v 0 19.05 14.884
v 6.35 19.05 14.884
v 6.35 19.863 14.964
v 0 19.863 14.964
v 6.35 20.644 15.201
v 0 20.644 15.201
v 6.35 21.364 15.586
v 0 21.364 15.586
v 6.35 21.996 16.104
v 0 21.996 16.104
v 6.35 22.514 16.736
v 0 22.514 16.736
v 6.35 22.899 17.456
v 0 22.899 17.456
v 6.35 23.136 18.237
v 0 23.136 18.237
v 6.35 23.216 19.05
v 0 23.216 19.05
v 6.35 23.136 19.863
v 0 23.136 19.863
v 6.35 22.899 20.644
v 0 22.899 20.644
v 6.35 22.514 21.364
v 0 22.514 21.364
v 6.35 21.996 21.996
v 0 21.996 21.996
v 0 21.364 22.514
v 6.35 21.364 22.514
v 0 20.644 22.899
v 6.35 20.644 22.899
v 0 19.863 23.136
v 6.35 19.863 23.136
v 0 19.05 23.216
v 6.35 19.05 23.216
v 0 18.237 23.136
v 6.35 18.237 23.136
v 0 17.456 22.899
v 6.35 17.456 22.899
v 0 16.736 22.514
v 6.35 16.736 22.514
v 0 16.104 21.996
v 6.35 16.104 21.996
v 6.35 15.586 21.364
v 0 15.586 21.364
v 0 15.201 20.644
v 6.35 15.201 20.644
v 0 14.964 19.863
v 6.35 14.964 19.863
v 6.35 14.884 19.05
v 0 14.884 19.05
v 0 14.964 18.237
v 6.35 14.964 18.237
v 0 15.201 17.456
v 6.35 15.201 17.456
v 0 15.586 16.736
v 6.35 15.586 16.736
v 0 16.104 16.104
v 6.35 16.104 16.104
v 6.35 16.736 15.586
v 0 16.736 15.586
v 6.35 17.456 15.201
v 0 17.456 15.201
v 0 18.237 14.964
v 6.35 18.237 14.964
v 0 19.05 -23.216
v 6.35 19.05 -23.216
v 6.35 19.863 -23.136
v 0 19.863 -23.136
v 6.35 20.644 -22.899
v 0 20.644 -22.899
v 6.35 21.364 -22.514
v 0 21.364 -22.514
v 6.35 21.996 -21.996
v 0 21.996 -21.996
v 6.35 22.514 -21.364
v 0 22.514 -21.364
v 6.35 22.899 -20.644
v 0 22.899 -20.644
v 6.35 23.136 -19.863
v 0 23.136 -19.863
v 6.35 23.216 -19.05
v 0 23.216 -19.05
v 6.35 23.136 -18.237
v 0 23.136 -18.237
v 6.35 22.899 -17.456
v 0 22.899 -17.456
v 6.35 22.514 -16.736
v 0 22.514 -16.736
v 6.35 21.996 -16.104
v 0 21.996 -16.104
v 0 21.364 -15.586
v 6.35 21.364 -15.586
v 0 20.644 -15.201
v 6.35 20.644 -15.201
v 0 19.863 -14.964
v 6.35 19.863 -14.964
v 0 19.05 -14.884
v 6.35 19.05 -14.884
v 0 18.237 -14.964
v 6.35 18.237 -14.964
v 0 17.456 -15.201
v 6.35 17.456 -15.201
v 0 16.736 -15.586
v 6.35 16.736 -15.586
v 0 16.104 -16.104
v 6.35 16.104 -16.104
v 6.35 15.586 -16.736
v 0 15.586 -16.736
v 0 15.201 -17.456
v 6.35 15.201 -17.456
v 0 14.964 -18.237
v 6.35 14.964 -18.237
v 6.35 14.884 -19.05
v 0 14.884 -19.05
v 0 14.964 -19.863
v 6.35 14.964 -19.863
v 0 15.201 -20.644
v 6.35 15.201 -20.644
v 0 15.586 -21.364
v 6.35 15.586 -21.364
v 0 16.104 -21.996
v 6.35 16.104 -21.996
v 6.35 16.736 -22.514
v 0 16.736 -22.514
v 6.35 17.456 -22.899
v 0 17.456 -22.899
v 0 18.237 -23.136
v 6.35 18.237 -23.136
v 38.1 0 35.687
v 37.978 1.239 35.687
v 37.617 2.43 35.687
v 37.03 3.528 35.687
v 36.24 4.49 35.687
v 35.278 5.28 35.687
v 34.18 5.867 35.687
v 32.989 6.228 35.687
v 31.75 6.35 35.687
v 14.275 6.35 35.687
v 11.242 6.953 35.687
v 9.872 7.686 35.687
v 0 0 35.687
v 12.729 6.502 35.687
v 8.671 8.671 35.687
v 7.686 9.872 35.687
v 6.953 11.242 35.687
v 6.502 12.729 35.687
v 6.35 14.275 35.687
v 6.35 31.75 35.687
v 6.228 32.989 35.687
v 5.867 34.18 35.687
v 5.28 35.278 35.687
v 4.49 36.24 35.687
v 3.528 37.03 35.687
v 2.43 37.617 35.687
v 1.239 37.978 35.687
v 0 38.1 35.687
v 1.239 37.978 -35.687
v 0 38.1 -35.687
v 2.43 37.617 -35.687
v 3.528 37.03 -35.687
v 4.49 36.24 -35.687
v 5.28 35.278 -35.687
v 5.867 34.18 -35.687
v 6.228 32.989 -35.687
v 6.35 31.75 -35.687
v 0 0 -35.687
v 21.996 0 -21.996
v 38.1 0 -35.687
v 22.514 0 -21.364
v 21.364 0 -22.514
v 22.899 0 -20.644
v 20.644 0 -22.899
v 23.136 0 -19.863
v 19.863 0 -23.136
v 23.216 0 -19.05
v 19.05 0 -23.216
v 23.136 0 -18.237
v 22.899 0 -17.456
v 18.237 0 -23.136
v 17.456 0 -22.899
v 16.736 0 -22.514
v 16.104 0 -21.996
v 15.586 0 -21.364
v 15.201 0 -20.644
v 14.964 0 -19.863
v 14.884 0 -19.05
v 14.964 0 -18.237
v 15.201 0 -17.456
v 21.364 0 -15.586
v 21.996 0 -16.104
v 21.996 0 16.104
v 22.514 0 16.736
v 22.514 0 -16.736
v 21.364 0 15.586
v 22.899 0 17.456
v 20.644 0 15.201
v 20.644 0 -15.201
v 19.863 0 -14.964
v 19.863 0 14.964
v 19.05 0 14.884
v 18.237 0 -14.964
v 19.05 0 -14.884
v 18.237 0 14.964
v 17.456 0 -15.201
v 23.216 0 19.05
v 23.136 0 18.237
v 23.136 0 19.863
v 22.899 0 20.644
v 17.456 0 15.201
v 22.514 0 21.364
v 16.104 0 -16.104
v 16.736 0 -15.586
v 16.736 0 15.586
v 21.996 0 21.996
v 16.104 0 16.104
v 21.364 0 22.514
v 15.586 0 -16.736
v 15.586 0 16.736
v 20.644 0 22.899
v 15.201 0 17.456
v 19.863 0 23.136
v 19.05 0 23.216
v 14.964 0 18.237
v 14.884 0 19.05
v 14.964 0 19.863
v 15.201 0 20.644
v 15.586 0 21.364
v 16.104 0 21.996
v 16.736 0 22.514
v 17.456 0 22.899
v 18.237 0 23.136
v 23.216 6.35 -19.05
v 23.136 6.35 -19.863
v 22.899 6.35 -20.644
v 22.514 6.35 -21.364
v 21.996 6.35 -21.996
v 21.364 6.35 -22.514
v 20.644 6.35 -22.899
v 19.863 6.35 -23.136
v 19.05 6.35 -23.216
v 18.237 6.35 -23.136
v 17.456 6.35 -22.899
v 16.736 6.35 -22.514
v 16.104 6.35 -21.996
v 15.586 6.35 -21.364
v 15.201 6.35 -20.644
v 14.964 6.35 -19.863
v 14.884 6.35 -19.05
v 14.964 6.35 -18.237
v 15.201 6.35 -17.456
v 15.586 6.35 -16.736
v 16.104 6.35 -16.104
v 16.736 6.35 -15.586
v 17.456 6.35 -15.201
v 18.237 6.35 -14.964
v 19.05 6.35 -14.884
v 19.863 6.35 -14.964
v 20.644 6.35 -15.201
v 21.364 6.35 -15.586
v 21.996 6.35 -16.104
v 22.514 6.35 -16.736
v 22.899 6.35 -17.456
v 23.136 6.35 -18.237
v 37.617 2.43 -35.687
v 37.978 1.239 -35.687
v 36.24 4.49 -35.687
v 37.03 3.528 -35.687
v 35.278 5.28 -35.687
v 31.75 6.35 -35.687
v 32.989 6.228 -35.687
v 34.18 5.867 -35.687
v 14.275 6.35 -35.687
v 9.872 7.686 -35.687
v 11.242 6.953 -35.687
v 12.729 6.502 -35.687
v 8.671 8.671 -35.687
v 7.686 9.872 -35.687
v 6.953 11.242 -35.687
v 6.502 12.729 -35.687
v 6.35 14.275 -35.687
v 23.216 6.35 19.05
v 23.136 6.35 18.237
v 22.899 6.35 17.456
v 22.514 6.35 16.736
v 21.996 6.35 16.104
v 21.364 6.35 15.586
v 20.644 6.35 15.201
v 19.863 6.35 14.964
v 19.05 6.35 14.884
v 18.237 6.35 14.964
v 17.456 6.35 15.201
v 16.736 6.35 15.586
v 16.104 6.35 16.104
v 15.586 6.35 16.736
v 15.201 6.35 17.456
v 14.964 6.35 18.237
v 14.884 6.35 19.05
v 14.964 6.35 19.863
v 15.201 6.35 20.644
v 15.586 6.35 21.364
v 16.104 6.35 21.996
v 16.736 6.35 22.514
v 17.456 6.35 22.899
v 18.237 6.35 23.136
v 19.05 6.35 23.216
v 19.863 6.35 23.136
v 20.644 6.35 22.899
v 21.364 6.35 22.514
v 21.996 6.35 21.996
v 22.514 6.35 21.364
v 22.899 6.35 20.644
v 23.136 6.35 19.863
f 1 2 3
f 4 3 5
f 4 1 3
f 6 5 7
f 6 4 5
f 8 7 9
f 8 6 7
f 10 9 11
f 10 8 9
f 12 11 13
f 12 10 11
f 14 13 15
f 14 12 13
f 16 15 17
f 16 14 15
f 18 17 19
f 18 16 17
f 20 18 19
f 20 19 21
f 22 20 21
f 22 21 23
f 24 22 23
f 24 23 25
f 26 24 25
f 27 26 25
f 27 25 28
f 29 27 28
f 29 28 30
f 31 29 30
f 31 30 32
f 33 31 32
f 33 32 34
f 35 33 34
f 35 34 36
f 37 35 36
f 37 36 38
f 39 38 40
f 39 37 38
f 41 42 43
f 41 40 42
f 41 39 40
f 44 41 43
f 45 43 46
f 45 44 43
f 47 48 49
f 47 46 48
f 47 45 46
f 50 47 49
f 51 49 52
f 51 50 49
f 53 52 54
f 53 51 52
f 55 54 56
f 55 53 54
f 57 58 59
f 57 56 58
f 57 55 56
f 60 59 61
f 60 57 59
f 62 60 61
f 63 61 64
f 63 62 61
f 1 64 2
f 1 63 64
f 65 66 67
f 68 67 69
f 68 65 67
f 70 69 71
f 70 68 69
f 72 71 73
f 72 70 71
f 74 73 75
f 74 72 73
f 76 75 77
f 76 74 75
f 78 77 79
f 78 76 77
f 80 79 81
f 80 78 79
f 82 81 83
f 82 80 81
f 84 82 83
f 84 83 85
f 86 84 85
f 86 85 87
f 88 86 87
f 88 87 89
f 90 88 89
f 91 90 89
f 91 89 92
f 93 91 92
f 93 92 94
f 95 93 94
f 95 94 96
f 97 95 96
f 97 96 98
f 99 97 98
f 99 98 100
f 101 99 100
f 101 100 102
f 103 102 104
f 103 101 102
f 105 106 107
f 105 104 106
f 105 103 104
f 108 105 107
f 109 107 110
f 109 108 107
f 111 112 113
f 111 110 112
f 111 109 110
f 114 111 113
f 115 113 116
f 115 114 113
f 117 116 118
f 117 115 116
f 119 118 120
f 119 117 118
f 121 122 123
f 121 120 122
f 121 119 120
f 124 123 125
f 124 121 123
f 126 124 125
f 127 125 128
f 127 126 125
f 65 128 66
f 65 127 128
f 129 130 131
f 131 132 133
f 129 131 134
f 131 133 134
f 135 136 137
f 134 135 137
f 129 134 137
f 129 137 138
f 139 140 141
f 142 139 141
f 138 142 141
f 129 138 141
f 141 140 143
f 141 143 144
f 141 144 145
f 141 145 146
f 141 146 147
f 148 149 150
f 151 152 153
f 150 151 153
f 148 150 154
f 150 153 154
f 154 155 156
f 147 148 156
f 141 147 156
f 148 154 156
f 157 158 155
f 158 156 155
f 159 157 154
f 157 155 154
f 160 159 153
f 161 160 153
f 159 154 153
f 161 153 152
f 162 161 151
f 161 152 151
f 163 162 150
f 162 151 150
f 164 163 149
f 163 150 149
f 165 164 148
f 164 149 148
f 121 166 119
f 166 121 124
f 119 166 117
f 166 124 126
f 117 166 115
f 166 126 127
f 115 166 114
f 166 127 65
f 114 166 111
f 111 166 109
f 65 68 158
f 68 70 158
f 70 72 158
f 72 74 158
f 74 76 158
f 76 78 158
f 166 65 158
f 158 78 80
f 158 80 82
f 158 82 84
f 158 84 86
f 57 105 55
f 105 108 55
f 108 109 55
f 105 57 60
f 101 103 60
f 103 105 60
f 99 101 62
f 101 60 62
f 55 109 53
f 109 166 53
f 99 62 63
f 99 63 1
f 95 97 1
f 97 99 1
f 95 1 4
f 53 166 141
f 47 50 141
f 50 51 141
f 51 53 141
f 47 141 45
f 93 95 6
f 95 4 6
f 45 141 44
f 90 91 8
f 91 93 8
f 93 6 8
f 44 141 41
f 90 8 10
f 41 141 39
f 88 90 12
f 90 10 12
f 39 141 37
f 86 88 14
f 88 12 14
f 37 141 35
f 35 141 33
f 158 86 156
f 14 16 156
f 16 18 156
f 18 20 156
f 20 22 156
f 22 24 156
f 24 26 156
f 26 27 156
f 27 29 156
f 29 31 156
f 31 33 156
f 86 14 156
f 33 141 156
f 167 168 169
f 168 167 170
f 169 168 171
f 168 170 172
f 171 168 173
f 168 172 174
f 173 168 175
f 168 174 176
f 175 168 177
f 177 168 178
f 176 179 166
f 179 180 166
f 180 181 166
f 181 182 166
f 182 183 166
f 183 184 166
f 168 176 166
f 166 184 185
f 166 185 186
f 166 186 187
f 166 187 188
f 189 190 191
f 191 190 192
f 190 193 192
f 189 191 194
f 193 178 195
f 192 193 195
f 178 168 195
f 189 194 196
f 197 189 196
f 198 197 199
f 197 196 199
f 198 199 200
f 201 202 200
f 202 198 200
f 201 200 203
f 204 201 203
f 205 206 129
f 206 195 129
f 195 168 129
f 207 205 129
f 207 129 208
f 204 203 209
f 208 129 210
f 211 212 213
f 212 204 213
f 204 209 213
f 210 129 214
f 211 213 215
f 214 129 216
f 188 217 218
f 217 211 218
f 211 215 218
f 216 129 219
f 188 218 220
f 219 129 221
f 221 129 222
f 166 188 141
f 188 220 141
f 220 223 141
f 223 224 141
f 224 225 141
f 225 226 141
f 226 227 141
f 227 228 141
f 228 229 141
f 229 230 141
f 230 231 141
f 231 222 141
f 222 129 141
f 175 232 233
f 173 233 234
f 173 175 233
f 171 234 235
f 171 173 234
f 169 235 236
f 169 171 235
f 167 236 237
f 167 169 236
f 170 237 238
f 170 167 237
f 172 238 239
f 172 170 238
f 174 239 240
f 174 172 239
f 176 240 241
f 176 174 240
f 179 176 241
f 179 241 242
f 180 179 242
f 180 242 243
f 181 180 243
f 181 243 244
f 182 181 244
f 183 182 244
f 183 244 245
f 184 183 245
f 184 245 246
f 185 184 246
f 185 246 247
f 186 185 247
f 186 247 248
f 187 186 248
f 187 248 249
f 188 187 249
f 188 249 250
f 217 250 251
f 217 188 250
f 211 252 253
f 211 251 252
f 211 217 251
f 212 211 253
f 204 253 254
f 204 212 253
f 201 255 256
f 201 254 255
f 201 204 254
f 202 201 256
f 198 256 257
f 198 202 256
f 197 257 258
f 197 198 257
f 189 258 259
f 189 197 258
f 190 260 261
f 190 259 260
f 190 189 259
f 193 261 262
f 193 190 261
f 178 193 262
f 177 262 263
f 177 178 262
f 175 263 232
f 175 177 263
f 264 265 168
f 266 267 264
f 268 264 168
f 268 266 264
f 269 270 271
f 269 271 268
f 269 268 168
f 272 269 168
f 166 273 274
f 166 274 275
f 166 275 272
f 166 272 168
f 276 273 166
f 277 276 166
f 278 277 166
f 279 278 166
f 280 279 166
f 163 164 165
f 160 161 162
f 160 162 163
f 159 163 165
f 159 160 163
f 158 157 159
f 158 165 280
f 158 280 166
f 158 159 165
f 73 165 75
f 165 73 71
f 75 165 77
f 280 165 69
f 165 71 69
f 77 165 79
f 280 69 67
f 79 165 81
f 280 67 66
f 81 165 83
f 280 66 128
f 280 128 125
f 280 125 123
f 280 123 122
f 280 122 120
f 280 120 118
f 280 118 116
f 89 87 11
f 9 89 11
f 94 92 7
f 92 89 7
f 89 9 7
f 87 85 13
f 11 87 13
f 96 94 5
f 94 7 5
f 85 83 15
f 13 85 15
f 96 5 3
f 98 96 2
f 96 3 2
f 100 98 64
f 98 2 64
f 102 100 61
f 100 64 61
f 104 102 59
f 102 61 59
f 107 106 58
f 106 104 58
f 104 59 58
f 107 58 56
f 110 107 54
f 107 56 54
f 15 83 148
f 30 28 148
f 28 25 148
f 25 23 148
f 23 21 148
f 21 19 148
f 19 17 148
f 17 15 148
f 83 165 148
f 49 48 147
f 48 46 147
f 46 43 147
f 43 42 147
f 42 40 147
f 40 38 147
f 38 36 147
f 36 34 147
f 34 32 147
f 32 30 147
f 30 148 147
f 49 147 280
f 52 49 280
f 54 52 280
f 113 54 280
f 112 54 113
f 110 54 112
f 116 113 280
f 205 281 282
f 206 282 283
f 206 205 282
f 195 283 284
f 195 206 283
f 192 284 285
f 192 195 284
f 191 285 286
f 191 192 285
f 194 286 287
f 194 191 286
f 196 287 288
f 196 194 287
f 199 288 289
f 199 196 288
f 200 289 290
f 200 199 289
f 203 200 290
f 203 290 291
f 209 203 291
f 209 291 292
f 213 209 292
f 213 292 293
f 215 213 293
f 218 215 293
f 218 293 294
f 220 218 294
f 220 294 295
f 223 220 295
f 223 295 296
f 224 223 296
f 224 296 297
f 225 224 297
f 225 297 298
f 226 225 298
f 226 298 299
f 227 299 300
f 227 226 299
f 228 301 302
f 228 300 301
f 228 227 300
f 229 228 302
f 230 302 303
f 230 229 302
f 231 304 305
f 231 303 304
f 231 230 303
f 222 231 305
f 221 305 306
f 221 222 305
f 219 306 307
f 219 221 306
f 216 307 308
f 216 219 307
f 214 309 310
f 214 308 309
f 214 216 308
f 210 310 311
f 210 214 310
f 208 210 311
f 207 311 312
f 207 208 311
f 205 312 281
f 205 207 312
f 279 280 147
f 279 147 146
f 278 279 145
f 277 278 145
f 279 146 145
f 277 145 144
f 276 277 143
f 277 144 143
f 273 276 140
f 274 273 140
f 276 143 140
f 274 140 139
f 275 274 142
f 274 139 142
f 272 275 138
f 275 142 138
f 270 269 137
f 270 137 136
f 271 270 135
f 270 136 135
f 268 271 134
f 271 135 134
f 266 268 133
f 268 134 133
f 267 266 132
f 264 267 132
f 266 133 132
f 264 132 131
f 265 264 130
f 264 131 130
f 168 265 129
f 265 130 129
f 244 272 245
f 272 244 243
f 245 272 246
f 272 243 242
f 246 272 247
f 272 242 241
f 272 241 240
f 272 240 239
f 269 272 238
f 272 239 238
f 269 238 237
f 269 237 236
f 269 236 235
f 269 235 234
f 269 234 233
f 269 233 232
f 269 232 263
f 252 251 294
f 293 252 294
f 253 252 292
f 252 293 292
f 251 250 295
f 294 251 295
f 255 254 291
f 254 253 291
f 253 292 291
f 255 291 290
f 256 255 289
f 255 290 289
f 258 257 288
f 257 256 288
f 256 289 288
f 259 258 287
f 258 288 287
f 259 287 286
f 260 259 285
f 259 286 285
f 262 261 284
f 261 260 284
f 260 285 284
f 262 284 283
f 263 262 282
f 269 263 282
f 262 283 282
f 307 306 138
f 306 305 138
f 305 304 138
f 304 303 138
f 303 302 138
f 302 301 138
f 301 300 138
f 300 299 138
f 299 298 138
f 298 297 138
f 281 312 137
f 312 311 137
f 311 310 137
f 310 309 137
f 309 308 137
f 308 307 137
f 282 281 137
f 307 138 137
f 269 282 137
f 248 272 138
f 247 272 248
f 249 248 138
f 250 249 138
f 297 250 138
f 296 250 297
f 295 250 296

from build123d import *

# Parameters (mm, degrees)
BOSS_EXTRUDE1_DEPTH      = 35.687
BOSS_EXTRUDE1_DEPTH_BACK = 35.687
SKETCH3_R                = 4.1656
CUT_EXTRUDE1_DEPTH       = 39.1
SKETCH5_R                = 4.1656
CUT_EXTRUDE2_DEPTH       = 39.1


with BuildPart() as part:
    # Sketch4 → Boss-Extrude1 (new body, two sides)
    with BuildSketch(Plane.XY) as boss_extrude1_sk:
        with BuildLine():
            Line((38.1, 0), (0, 0))
            Line((0, 0), (0, 38.1))
            ThreePointArc((0, 38.1), (4.490128061, 36.240128061), (6.35, 31.75))
            Line((6.35, 31.75), (6.35, 14.2748))
            ThreePointArc((6.35, 14.2748), (8.67112018, 8.67112018), (14.2748, 6.35))
            Line((14.2748, 6.35), (31.75, 6.35))
            ThreePointArc((31.75, 6.35), (36.240128061, 4.490128061), (38.1, 0))
        make_face()
    extrude(amount=BOSS_EXTRUDE1_DEPTH)
    extrude(boss_extrude1_sk.sketch, amount=-BOSS_EXTRUDE1_DEPTH_BACK)

    # Sketch3 → Cut-Extrude1 (cut, through all)
    with BuildSketch(Plane(origin=(0, 0, 0), x_dir=(1, 0, 0), z_dir=(0, 1, 0))):
        with Locations((19.05, -19.05)):
            Circle(SKETCH3_R)
        with Locations((19.05, 19.05)):
            Circle(SKETCH3_R)
    extrude(amount=CUT_EXTRUDE1_DEPTH, mode=Mode.SUBTRACT)

    # Sketch5 → Cut-Extrude2 (cut, through all)
    with BuildSketch(Plane(origin=(0, 0, 0), x_dir=(0, 0, -1), z_dir=(1, 0, 0))):
        with Locations((-19.05, 19.05)):
            Circle(SKETCH5_R)
        with Locations((19.05, 19.05)):
            Circle(SKETCH5_R)
    extrude(amount=CUT_EXTRUDE2_DEPTH, mode=Mode.SUBTRACT)


solid = part.part
